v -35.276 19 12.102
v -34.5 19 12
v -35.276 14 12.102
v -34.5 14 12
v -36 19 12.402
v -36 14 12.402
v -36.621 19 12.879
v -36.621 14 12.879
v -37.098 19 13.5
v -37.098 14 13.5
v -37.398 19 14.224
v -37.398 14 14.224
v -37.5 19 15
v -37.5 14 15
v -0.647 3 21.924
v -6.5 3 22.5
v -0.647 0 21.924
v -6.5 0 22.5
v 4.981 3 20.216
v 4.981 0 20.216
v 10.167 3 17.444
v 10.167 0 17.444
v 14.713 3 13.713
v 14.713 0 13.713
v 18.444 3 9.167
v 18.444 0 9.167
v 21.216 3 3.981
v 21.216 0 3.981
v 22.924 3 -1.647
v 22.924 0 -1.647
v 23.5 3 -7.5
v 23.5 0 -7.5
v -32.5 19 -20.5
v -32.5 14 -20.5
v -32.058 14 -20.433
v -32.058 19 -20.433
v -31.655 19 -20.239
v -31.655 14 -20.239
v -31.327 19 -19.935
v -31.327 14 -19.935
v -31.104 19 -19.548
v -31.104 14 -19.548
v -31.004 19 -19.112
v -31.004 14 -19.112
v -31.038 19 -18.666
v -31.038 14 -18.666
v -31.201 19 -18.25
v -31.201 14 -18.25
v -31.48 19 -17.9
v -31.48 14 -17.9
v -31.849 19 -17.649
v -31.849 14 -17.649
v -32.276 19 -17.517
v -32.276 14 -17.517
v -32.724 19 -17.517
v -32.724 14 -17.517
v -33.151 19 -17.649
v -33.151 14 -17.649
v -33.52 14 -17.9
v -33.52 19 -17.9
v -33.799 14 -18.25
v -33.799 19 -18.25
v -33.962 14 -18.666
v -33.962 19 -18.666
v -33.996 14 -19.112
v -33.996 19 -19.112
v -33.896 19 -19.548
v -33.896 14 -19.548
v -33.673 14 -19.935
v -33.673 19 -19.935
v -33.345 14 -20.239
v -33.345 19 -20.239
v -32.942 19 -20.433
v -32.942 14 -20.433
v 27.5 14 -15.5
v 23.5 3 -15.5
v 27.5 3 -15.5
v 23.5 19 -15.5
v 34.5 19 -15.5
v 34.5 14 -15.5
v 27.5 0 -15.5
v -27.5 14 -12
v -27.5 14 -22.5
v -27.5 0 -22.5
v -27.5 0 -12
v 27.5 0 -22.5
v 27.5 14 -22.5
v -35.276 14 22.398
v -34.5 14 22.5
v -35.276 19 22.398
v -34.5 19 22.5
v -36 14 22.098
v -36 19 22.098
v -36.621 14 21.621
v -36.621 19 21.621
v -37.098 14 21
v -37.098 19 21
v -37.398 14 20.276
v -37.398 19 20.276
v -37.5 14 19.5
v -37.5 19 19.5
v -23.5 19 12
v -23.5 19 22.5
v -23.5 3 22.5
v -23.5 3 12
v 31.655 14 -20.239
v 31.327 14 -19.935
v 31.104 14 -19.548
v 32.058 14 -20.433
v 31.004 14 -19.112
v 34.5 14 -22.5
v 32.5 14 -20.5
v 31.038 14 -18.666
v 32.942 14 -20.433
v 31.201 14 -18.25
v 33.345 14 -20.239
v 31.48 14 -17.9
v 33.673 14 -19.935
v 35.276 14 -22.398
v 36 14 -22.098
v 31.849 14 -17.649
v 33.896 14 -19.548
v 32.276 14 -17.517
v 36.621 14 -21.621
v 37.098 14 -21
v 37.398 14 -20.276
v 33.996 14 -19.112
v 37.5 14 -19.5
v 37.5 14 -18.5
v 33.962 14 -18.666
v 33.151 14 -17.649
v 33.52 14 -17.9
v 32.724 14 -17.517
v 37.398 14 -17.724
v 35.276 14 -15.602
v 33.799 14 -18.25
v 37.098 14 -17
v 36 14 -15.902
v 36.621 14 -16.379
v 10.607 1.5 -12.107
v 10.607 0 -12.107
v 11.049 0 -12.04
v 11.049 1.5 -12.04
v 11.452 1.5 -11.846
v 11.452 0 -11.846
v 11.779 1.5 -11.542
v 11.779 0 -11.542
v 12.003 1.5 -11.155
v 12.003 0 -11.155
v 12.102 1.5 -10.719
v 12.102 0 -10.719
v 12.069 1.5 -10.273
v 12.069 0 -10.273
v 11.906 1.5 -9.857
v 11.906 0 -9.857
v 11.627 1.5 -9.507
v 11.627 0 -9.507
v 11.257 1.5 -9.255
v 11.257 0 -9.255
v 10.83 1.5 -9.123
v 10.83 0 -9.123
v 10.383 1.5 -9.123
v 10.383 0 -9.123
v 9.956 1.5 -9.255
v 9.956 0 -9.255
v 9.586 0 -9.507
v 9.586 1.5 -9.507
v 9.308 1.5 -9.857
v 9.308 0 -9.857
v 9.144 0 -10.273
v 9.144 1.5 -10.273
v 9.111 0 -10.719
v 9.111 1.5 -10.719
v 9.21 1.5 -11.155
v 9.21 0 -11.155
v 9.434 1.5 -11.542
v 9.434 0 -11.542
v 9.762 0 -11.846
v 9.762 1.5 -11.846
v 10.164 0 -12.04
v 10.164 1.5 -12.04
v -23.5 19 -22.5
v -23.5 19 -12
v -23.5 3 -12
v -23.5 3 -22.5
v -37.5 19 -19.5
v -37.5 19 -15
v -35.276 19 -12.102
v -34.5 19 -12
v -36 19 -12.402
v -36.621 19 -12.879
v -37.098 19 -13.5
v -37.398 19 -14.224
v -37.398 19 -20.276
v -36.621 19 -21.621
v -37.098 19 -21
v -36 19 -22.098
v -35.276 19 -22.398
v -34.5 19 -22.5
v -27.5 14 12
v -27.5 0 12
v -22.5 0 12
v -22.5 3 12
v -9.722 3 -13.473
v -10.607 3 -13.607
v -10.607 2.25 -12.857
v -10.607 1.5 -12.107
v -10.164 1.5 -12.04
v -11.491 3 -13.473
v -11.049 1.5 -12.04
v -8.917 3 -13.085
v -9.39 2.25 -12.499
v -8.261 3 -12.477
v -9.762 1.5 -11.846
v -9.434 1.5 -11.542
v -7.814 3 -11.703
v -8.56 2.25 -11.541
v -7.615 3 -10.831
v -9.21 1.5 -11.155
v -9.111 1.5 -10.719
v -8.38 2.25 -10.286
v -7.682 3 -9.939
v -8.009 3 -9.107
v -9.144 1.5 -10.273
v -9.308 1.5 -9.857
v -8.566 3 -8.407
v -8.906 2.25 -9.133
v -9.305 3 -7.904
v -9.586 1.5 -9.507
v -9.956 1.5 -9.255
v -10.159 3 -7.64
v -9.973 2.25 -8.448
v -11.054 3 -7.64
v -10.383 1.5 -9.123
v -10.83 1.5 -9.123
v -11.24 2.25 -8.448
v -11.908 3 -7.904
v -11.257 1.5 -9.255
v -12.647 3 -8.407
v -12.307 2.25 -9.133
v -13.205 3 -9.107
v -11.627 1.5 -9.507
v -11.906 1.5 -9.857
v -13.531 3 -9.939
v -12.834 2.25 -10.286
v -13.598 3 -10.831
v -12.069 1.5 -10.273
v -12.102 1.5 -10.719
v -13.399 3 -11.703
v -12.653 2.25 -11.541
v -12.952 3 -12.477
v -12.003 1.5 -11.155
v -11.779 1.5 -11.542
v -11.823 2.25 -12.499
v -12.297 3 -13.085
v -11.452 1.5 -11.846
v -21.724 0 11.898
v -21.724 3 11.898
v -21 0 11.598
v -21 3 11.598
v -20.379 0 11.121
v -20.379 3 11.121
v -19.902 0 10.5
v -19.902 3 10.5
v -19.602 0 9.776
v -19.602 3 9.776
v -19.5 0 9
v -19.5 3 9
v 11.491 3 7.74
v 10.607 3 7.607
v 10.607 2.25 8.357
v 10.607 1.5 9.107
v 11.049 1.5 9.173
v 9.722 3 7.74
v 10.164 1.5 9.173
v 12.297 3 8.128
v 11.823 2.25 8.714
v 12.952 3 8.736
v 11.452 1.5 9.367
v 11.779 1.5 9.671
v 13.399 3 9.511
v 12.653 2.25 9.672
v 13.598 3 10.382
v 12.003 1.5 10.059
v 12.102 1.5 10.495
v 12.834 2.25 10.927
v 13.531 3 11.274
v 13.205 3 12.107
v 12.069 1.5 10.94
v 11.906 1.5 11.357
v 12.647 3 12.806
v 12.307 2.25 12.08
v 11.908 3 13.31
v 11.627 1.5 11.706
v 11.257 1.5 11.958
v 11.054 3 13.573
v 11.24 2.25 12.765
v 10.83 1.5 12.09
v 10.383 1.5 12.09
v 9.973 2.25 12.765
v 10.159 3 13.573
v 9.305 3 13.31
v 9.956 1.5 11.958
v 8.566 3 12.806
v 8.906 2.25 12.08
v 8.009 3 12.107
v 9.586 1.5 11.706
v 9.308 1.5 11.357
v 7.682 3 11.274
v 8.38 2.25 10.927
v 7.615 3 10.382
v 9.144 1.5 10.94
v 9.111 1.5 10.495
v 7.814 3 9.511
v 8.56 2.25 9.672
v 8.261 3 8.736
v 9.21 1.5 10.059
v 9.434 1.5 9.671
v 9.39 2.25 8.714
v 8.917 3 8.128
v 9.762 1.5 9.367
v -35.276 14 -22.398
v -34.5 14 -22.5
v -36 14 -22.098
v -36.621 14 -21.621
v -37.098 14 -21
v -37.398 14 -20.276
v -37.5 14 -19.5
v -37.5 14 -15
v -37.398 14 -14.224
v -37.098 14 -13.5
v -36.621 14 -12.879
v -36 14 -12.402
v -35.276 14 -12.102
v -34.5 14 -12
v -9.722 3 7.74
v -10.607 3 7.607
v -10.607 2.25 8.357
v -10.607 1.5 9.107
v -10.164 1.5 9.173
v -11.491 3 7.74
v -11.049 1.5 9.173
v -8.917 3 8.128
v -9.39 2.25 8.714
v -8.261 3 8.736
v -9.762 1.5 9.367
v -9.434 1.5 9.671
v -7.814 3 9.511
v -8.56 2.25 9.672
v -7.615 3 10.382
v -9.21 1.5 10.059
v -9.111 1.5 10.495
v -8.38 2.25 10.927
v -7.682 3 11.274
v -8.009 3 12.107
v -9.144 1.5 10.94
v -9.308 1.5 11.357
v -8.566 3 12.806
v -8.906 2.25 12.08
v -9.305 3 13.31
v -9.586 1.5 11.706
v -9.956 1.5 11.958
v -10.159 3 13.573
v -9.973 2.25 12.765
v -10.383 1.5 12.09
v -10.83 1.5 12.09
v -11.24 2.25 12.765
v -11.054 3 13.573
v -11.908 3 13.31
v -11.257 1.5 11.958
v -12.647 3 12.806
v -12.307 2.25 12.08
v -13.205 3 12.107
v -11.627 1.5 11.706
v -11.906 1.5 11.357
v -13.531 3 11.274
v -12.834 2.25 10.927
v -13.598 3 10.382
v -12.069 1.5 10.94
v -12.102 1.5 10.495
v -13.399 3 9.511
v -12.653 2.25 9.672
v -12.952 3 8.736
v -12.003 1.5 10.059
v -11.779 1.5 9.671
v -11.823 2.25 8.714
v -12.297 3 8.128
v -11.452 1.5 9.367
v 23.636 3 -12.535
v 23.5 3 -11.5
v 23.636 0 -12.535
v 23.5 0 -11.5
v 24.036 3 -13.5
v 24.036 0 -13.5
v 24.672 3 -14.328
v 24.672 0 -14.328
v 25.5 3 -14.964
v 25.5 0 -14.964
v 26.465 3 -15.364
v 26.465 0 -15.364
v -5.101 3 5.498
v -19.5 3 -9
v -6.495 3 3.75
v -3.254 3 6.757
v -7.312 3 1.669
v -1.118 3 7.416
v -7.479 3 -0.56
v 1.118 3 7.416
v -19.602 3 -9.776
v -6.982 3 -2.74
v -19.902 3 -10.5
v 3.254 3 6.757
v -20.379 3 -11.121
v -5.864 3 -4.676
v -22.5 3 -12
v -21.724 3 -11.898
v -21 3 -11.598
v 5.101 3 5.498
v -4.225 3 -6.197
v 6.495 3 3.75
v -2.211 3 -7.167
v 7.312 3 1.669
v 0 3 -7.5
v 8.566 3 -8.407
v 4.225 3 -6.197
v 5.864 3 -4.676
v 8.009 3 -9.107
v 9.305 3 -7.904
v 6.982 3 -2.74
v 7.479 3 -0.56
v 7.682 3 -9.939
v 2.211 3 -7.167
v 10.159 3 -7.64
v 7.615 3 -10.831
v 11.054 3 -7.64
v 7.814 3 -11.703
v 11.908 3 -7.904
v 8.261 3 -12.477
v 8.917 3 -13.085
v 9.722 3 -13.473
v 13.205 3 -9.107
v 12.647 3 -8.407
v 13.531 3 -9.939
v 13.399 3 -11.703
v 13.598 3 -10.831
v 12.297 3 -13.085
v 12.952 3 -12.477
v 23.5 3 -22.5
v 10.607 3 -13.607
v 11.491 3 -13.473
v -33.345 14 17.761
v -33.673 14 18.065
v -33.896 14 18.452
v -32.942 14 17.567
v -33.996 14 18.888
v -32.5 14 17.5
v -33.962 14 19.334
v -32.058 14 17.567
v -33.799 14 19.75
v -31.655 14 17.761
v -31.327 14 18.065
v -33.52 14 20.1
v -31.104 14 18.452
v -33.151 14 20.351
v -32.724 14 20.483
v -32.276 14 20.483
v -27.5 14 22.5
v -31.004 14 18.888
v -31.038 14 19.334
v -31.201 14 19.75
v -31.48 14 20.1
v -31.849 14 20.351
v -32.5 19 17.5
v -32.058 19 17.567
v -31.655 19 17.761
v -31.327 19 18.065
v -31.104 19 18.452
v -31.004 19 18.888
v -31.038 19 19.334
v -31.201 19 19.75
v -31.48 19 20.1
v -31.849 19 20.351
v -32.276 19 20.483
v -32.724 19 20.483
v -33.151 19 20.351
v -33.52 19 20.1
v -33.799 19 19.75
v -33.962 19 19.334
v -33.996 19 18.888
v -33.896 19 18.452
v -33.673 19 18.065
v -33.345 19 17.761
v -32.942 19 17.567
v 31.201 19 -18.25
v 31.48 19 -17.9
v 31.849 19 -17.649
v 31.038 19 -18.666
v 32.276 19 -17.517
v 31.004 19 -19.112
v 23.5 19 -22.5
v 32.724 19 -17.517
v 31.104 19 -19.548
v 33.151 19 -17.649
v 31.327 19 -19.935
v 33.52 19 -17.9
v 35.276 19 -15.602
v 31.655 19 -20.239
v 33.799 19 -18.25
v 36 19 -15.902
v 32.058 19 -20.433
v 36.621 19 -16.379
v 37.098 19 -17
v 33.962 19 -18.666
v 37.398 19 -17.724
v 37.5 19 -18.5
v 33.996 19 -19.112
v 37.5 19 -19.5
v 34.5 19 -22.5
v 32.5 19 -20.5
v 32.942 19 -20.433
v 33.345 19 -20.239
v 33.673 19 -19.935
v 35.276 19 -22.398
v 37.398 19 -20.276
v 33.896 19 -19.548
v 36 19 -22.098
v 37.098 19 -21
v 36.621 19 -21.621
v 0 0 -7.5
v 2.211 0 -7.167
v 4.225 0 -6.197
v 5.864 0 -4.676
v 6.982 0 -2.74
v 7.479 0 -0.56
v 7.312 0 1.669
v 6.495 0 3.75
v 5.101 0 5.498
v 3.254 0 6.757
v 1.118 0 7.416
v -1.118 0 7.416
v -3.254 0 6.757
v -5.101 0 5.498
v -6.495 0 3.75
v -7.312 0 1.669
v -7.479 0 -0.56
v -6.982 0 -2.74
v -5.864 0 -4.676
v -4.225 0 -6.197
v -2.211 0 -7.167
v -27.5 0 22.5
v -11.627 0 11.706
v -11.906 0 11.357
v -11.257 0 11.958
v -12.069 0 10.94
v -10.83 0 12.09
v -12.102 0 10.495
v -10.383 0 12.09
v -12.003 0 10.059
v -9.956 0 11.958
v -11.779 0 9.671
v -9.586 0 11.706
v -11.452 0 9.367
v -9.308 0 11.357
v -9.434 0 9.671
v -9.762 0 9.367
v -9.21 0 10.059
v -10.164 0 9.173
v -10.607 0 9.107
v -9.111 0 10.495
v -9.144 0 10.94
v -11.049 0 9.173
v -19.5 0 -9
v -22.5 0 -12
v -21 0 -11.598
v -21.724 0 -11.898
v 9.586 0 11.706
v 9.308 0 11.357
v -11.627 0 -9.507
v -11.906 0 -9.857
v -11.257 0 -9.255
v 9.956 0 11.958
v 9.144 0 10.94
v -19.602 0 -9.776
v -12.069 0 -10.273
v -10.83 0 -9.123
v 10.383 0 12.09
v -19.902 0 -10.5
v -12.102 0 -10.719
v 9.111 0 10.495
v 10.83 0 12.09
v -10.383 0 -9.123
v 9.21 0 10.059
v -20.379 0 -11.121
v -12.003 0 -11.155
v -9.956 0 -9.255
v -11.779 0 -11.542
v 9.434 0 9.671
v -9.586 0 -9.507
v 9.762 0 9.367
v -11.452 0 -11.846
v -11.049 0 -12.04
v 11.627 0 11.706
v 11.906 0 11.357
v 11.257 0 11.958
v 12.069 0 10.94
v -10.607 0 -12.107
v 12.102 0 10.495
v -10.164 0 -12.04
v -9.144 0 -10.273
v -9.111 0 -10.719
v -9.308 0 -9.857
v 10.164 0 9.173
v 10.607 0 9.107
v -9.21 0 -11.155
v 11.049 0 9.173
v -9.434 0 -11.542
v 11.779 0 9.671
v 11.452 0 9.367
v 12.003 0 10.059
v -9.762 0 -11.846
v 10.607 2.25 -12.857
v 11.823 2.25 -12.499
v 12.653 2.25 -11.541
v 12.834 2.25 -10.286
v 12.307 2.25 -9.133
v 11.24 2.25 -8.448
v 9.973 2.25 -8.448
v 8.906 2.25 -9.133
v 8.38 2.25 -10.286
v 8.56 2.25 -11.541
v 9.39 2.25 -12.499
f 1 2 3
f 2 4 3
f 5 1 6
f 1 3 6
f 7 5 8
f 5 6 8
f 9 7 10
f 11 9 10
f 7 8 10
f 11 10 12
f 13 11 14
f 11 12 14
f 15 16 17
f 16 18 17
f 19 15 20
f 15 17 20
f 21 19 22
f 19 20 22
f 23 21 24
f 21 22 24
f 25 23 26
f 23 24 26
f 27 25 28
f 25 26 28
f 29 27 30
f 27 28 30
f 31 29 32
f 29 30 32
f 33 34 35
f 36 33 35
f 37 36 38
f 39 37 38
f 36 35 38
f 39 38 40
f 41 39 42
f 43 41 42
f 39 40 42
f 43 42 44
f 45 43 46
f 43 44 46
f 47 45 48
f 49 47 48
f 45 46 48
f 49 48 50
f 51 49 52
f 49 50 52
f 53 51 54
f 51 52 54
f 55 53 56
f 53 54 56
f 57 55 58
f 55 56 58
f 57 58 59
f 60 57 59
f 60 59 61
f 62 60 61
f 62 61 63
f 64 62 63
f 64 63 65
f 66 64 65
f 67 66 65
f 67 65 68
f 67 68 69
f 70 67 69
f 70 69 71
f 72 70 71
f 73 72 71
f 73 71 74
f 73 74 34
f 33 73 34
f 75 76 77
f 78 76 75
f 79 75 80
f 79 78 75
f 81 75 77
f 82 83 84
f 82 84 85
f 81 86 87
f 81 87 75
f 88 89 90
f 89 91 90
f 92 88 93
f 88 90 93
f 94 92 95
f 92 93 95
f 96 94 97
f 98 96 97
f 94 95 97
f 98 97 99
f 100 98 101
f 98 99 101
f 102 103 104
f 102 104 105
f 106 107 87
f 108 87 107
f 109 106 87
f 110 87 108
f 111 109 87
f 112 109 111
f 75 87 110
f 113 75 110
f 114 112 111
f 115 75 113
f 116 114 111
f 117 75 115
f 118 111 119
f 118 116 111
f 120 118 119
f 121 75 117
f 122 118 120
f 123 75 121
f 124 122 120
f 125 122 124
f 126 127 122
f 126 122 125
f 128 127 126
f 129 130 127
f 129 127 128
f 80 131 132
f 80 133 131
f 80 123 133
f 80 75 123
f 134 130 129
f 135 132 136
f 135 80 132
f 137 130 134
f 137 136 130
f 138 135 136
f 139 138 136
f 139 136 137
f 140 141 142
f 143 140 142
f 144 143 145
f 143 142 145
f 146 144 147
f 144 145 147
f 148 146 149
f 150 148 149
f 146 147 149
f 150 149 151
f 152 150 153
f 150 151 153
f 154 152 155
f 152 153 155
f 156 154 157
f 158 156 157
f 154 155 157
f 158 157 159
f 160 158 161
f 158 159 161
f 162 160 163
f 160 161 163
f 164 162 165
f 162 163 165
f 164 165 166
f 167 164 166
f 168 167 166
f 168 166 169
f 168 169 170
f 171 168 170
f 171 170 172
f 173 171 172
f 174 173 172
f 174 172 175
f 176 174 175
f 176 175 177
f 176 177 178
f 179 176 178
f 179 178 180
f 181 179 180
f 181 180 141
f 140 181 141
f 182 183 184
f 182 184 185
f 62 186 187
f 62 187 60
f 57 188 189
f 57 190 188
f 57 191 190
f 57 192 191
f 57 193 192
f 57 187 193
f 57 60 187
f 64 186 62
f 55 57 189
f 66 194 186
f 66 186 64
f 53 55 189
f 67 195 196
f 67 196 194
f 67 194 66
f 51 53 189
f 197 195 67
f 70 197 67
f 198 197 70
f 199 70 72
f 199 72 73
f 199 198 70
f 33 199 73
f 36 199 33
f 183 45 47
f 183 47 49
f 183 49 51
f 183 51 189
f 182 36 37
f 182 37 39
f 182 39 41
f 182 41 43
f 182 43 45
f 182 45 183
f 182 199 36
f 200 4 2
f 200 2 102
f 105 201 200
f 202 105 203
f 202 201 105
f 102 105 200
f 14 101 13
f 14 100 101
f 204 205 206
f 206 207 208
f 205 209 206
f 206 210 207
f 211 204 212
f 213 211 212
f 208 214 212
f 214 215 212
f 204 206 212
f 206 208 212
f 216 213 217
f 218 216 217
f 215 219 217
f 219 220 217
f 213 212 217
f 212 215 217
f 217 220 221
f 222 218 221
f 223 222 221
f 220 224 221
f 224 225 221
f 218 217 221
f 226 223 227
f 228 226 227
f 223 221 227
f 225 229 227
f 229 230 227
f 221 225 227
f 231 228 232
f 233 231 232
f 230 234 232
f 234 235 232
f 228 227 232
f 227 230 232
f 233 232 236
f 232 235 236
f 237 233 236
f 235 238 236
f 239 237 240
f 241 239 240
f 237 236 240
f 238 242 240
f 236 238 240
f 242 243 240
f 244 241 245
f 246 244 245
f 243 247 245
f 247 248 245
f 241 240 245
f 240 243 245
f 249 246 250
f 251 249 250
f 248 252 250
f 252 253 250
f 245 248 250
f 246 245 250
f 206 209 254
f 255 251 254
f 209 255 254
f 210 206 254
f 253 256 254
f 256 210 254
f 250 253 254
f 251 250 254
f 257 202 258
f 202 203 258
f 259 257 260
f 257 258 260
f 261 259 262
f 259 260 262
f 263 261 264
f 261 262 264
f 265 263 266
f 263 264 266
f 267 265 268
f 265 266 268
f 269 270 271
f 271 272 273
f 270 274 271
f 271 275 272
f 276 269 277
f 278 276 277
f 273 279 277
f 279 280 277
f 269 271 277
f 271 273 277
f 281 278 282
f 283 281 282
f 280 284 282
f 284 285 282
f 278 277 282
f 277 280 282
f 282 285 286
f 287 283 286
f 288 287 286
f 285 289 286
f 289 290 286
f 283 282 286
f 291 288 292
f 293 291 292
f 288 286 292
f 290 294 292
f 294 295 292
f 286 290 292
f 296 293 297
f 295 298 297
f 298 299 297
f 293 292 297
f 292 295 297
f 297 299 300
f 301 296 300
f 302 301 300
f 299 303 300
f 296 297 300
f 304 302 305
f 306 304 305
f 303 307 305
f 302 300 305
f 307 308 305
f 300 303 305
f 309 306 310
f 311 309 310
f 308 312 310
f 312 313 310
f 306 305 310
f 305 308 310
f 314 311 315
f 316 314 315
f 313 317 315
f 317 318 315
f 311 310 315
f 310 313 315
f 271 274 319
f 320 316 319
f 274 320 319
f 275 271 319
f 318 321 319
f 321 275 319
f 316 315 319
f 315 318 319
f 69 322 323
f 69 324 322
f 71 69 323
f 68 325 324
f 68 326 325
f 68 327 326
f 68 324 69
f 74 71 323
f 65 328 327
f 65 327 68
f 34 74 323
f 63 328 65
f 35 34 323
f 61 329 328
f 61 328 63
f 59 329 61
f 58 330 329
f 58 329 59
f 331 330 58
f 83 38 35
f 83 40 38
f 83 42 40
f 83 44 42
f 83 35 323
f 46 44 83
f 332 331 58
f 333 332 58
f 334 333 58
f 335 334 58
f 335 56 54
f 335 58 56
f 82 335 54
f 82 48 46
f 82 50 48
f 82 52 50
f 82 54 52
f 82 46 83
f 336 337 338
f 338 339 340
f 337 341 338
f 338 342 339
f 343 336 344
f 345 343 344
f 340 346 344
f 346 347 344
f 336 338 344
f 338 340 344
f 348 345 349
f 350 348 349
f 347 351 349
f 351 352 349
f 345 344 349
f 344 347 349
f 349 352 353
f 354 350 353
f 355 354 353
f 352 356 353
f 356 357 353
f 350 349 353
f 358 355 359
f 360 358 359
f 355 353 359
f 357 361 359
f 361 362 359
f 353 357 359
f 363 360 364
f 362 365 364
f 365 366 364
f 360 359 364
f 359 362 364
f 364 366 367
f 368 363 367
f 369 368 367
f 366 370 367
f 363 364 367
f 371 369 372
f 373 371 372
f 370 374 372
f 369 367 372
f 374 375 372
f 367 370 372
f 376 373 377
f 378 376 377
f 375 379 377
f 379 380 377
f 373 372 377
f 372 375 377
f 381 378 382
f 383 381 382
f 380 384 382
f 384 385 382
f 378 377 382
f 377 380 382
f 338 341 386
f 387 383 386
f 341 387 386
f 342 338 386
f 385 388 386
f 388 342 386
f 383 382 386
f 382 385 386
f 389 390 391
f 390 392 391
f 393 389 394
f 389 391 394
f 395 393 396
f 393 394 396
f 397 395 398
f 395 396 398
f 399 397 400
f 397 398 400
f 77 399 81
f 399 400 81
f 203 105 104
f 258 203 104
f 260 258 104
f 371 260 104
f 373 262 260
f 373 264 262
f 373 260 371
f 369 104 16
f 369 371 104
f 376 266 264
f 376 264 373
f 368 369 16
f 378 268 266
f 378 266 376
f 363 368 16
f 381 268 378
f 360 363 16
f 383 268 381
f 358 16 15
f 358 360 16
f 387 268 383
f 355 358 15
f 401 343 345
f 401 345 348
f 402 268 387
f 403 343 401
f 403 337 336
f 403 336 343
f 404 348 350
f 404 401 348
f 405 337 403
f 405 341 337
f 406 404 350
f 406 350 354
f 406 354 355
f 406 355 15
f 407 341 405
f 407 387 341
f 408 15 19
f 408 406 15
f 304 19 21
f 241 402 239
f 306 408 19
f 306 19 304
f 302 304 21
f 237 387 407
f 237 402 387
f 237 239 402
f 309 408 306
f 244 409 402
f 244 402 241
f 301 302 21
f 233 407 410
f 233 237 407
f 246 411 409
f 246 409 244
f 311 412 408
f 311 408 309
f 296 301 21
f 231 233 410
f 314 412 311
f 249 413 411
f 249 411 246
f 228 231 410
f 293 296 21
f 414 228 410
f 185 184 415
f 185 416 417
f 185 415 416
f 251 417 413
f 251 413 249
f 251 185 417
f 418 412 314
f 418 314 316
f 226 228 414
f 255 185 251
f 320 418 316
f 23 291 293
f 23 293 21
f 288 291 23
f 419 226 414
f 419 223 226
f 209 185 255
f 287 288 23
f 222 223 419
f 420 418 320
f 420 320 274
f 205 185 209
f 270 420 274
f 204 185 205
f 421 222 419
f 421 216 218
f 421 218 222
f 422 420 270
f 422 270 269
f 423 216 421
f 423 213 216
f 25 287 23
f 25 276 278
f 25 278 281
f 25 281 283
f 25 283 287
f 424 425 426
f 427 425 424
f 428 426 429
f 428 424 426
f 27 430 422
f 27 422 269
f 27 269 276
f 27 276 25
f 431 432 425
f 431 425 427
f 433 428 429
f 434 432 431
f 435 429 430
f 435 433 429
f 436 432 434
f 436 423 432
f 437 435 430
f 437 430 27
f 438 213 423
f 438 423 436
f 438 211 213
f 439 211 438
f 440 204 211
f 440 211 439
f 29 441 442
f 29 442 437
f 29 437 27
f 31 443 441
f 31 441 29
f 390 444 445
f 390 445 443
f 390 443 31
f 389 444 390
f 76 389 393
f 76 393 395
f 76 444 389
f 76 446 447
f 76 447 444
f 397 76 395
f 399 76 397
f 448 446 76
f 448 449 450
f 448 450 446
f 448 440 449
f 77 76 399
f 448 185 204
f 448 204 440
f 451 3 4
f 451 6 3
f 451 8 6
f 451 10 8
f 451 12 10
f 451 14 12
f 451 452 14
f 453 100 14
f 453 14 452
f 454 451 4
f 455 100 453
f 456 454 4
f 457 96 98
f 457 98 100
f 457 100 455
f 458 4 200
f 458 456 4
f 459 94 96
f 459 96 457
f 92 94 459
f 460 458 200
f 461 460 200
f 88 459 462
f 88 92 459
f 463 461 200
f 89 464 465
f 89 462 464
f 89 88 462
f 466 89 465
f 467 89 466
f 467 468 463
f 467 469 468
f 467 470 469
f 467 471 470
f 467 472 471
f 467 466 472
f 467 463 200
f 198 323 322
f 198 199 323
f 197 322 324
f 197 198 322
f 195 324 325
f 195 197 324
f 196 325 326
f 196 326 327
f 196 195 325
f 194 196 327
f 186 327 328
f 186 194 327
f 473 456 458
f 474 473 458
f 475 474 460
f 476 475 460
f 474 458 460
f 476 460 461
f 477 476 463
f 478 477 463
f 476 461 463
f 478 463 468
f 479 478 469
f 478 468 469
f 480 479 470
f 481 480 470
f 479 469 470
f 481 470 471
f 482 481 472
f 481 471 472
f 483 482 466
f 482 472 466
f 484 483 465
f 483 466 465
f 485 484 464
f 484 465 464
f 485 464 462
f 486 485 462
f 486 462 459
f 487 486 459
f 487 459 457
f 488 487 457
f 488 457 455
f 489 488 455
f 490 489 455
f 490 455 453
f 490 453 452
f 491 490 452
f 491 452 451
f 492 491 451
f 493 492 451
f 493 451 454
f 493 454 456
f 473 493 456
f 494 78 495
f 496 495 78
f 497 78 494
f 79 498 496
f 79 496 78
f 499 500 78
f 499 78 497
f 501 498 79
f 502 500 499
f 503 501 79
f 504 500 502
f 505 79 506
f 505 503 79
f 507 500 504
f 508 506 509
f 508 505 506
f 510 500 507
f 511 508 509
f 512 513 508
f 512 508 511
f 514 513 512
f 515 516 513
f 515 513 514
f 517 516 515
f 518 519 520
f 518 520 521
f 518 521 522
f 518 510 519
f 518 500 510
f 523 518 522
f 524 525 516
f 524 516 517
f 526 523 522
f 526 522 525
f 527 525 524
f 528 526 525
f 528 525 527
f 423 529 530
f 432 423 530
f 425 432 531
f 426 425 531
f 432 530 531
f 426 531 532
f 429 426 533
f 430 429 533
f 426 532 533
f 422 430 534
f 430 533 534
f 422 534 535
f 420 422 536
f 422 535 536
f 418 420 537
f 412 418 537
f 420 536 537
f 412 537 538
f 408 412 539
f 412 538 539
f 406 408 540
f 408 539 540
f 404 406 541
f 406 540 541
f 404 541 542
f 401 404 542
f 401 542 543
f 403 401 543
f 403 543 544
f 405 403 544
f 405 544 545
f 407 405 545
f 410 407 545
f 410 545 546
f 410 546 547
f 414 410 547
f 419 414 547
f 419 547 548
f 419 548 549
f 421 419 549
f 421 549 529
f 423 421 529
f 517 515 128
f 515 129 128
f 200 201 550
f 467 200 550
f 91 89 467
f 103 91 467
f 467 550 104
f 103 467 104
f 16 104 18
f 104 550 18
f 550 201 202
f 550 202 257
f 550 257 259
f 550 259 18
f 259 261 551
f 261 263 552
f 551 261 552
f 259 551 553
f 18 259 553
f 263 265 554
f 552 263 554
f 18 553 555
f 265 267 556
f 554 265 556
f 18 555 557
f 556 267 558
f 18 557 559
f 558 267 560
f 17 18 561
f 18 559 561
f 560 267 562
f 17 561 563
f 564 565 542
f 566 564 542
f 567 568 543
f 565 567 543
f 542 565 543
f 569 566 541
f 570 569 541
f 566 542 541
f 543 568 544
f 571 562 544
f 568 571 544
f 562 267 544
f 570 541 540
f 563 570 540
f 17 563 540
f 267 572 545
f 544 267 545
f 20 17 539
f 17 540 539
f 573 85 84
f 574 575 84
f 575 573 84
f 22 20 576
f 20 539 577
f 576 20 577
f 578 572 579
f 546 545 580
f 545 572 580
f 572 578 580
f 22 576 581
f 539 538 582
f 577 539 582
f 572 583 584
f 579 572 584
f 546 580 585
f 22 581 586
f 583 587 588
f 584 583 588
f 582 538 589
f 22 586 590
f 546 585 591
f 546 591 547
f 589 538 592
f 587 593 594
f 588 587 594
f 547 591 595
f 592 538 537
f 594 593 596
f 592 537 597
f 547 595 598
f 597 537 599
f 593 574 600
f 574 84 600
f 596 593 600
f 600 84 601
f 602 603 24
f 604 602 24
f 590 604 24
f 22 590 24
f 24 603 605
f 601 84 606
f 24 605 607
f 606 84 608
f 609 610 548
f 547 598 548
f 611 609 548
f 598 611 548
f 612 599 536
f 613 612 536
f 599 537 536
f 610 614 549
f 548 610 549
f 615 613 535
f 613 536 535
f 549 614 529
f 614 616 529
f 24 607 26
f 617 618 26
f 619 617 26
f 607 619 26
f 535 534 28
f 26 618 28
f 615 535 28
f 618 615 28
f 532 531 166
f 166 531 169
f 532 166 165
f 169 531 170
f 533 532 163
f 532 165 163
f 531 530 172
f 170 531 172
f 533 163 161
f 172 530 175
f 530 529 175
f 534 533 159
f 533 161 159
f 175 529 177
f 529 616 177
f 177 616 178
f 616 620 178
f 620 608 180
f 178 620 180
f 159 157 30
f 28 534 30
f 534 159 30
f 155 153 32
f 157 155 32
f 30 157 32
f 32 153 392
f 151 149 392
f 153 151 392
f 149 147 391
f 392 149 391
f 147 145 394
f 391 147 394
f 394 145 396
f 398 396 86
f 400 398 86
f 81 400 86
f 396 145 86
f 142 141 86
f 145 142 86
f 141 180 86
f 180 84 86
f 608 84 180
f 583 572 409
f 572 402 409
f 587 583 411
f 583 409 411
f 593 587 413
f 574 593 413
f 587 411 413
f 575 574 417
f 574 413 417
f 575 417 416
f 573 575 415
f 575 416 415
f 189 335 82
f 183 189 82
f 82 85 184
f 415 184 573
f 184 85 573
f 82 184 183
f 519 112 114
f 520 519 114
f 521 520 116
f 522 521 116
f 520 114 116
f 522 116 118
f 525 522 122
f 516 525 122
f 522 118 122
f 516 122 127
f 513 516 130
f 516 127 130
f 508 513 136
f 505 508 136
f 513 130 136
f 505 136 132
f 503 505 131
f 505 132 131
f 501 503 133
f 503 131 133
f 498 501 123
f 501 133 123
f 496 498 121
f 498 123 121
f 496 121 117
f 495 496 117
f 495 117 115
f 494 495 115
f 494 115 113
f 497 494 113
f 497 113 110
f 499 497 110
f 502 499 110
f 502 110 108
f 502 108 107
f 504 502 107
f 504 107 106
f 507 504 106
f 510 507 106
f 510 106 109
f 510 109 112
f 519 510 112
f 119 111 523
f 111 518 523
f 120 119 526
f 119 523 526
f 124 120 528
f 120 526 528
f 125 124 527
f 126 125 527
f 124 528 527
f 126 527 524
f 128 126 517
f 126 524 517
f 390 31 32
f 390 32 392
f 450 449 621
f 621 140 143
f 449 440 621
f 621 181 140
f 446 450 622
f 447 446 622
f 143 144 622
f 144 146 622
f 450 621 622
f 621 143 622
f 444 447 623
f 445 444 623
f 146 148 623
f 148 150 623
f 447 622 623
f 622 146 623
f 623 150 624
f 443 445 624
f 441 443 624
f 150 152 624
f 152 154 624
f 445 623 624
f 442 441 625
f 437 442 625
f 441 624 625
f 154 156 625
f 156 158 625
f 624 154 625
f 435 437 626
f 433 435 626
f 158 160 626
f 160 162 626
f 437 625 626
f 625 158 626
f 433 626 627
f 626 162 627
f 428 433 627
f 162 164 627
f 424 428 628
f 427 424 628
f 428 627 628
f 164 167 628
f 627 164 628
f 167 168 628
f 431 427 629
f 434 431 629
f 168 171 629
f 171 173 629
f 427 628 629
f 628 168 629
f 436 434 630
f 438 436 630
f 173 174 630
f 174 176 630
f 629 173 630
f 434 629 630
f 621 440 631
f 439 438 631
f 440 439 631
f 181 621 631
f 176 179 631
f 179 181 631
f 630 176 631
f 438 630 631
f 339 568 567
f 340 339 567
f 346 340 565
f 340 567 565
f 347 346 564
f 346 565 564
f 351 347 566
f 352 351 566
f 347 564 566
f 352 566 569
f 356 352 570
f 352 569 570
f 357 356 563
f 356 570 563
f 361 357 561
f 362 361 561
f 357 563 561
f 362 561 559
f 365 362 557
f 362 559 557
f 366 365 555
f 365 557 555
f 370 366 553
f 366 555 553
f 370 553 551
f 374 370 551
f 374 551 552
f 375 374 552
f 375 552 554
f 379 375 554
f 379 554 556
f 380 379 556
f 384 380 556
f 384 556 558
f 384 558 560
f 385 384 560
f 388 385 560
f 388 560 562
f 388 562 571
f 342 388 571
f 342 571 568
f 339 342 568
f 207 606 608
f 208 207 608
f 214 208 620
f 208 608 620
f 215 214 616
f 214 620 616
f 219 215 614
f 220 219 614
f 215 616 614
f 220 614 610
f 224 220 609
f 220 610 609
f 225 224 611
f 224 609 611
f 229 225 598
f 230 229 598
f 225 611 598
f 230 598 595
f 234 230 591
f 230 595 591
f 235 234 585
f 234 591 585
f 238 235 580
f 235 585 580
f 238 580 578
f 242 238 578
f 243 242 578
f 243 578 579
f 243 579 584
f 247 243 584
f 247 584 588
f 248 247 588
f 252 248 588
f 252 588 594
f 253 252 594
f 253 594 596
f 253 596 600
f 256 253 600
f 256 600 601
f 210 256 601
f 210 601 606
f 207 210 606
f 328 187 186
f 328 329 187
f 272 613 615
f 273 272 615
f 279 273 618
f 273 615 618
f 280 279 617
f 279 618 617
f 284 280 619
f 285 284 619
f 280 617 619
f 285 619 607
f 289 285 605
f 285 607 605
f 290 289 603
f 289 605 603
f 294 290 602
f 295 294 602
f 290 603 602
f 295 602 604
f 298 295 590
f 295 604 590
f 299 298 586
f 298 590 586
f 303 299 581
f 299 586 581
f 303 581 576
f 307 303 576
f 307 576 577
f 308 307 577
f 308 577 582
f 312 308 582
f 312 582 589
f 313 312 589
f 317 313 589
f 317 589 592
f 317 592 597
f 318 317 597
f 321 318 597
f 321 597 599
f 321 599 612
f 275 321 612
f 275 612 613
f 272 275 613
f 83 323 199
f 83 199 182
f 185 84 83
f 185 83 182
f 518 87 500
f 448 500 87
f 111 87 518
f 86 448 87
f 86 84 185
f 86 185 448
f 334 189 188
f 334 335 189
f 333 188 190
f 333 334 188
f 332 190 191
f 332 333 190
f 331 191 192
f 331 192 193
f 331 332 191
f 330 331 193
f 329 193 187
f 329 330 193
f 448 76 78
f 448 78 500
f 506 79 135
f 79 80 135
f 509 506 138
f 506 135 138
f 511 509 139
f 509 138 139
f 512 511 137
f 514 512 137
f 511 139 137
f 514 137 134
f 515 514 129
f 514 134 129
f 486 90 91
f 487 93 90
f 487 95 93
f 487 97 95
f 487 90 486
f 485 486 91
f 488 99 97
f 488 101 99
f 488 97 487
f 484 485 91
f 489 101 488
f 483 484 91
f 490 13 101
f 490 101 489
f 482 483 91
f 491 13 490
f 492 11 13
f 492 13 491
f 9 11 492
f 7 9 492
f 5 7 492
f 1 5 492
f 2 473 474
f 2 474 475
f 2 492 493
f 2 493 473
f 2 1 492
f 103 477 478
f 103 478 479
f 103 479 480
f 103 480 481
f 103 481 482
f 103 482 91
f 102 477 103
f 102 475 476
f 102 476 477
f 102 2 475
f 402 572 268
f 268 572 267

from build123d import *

# Parameters (mm, degrees)
SKETCH_1_W          = 75
SKETCH_1_H          = 45
EXTRUDE_1_DEPTH     = 19
SKETCH_2_W          = 10
SKETCH_2_H          = 45
CUT_EXTRUDE_1_DEPTH = 14
SKETCH_3_W          = 47
SKETCH_3_H          = 45
CUT_EXTRUDE_2_DEPTH = 16
SKETCH_4_R          = 1.5
SKETCH_4_R_2        = 7.5
CUT_EXTRUDE_3_DEPTH = 48.681233206
SKETCH_5_W          = 14
SKETCH_5_H          = 38
CUT_EXTRUDE_4_DEPTH = 48.681233206
FILLET_1_R          = 30
CHAMFER_1_SIZE      = 1.5
SKETCH_8_W          = 36
SKETCH_8_H          = 24
CUT_EXTRUDE_6_DEPTH = 48.681233206
FILLET_2_R          = 3
SKETCH_9_R          = 1.5
CUT_EXTRUDE_7_DEPTH = 46.918405896
FILLET_3_R          = 3
FILLET_4_R          = 4


with BuildPart() as part:
    # 草图1 → 凸台-拉伸1 (new body)
    with BuildSketch(Plane(origin=(0, 0, 0), x_dir=(1, 0, 0), z_dir=(0, 1, 0))):
        Rectangle(SKETCH_1_W, SKETCH_1_H)
    extrude(amount=EXTRUDE_1_DEPTH)

    # 草图2 → 切除-拉伸1 (cut)
    with BuildSketch(Plane.XZ):
        with Locations((-32.5, 0)):
            Rectangle(SKETCH_2_W, SKETCH_2_H)
        with Locations((32.5, 0)):
            Rectangle(SKETCH_2_W, SKETCH_2_H)
    extrude(amount=-CUT_EXTRUDE_1_DEPTH, mode=Mode.SUBTRACT)

    # 草图3 → 切除-拉伸2 (cut)
    with BuildSketch(Plane(origin=(0, 19, 0), x_dir=(1, 0, 0), z_dir=(0, 1, 0))):
        Rectangle(SKETCH_3_W, SKETCH_3_H)
    extrude(amount=-CUT_EXTRUDE_2_DEPTH, mode=Mode.SUBTRACT)

    # 草图4 → 切除-拉伸3 (cut, through all)
    with BuildSketch(Plane.XZ):
        with Locations(Location((10.606601718, 10.606601718, 0), (0, 0, 270))):
            Circle(SKETCH_4_R)
        with Locations(Location((10.606601718, -10.606601718, 0), (0, 0, 270))):
            Circle(SKETCH_4_R)
        with Locations(Location((-10.606601718, -10.606601718, 0), (0, 0, 270))):
            Circle(SKETCH_4_R)
        with Locations(Location((-10.606601718, 10.606601718, 0), (0, 0, 270))):
            Circle(SKETCH_4_R)
        with Locations(Location((0, 0, 0), (0, 0, 270))):
            Circle(SKETCH_4_R_2)
    extrude(amount=-CUT_EXTRUDE_3_DEPTH, mode=Mode.SUBTRACT)

    # 草图5 → 切除-拉伸4 (cut, through all)
    with BuildSketch(Plane(origin=(0, 19, 0), x_dir=(1, 0, 0), z_dir=(0, 1, 0))):
        with Locations((30.5, -3.5)):
            Rectangle(SKETCH_5_W, SKETCH_5_H)
    extrude(amount=-CUT_EXTRUDE_4_DEPTH, mode=Mode.SUBTRACT)

    # 圆角1
    fillet_1_edges = [part.edges().sort_by_distance(p)[0] for p in [
        (23.5, 1.5, 22.5),
    ]]
    fillet(fillet_1_edges, radius=FILLET_1_R)

    # 倒角1
    chamfer_1_edges = [part.edges().sort_by_distance(p)[0] for p in [
        (-10.606601718, 3, 12.106601718),
        (-10.606601718, 3, -9.106601718),
        (10.606601718, 3, -9.106601718),
        (10.606601718, 3, 12.106601718),
    ]]
    chamfer(chamfer_1_edges, length=CHAMFER_1_SIZE)

    # 草图8 → 切除-拉伸6 (cut, through all)
    with BuildSketch(Plane.XZ):
        with Locations((-37.5, 0)):
            Rectangle(SKETCH_8_W, SKETCH_8_H)
    extrude(amount=-CUT_EXTRUDE_6_DEPTH, mode=Mode.SUBTRACT)

    # 圆角2
    fillet_2_edges = [part.edges().sort_by_distance(p)[0] for p in [
        (-19.5, 1.5, 12),
        (-19.5, 1.5, -12),
    ]]
    fillet(fillet_2_edges, radius=FILLET_2_R)

    # 草图9 → 切除-拉伸7 (cut, through all)
    with BuildSketch(Plane.XZ.offset(-14)):
        with Locations(Location((32.5, -19, 0), (0, 0, 270))):
            Circle(SKETCH_9_R)
        with Locations(Location((-32.5, -19, 0), (0, 0, 270))):
            Circle(SKETCH_9_R)
        with Locations(Location((-32.5, 19, 0), (0, 0, 270))):
            Circle(SKETCH_9_R)
    extrude(amount=-CUT_EXTRUDE_7_DEPTH, mode=Mode.SUBTRACT)

    # 圆角3
    fillet_3_edges = [part.edges().sort_by_distance(p)[0] for p in [
        (-37.5, 16.5, 12),
        (-37.5, 16.5, -12),
        (-37.5, 16.5, 22.5),
        (-37.5, 16.5, -22.5),
        (37.5, 16.5, -22.5),
        (37.5, 16.5, -15.5),
    ]]
    fillet(fillet_3_edges, radius=FILLET_3_R)

    # 圆角4
    fillet_4_edges = [part.edges().sort_by_distance(p)[0] for p in [
        (23.5, 1.5, -15.5),
    ]]
    fillet(fillet_4_edges, radius=FILLET_4_R - 0.0001)  # a hair under: the kernel refuses the full size


solid = part.part
